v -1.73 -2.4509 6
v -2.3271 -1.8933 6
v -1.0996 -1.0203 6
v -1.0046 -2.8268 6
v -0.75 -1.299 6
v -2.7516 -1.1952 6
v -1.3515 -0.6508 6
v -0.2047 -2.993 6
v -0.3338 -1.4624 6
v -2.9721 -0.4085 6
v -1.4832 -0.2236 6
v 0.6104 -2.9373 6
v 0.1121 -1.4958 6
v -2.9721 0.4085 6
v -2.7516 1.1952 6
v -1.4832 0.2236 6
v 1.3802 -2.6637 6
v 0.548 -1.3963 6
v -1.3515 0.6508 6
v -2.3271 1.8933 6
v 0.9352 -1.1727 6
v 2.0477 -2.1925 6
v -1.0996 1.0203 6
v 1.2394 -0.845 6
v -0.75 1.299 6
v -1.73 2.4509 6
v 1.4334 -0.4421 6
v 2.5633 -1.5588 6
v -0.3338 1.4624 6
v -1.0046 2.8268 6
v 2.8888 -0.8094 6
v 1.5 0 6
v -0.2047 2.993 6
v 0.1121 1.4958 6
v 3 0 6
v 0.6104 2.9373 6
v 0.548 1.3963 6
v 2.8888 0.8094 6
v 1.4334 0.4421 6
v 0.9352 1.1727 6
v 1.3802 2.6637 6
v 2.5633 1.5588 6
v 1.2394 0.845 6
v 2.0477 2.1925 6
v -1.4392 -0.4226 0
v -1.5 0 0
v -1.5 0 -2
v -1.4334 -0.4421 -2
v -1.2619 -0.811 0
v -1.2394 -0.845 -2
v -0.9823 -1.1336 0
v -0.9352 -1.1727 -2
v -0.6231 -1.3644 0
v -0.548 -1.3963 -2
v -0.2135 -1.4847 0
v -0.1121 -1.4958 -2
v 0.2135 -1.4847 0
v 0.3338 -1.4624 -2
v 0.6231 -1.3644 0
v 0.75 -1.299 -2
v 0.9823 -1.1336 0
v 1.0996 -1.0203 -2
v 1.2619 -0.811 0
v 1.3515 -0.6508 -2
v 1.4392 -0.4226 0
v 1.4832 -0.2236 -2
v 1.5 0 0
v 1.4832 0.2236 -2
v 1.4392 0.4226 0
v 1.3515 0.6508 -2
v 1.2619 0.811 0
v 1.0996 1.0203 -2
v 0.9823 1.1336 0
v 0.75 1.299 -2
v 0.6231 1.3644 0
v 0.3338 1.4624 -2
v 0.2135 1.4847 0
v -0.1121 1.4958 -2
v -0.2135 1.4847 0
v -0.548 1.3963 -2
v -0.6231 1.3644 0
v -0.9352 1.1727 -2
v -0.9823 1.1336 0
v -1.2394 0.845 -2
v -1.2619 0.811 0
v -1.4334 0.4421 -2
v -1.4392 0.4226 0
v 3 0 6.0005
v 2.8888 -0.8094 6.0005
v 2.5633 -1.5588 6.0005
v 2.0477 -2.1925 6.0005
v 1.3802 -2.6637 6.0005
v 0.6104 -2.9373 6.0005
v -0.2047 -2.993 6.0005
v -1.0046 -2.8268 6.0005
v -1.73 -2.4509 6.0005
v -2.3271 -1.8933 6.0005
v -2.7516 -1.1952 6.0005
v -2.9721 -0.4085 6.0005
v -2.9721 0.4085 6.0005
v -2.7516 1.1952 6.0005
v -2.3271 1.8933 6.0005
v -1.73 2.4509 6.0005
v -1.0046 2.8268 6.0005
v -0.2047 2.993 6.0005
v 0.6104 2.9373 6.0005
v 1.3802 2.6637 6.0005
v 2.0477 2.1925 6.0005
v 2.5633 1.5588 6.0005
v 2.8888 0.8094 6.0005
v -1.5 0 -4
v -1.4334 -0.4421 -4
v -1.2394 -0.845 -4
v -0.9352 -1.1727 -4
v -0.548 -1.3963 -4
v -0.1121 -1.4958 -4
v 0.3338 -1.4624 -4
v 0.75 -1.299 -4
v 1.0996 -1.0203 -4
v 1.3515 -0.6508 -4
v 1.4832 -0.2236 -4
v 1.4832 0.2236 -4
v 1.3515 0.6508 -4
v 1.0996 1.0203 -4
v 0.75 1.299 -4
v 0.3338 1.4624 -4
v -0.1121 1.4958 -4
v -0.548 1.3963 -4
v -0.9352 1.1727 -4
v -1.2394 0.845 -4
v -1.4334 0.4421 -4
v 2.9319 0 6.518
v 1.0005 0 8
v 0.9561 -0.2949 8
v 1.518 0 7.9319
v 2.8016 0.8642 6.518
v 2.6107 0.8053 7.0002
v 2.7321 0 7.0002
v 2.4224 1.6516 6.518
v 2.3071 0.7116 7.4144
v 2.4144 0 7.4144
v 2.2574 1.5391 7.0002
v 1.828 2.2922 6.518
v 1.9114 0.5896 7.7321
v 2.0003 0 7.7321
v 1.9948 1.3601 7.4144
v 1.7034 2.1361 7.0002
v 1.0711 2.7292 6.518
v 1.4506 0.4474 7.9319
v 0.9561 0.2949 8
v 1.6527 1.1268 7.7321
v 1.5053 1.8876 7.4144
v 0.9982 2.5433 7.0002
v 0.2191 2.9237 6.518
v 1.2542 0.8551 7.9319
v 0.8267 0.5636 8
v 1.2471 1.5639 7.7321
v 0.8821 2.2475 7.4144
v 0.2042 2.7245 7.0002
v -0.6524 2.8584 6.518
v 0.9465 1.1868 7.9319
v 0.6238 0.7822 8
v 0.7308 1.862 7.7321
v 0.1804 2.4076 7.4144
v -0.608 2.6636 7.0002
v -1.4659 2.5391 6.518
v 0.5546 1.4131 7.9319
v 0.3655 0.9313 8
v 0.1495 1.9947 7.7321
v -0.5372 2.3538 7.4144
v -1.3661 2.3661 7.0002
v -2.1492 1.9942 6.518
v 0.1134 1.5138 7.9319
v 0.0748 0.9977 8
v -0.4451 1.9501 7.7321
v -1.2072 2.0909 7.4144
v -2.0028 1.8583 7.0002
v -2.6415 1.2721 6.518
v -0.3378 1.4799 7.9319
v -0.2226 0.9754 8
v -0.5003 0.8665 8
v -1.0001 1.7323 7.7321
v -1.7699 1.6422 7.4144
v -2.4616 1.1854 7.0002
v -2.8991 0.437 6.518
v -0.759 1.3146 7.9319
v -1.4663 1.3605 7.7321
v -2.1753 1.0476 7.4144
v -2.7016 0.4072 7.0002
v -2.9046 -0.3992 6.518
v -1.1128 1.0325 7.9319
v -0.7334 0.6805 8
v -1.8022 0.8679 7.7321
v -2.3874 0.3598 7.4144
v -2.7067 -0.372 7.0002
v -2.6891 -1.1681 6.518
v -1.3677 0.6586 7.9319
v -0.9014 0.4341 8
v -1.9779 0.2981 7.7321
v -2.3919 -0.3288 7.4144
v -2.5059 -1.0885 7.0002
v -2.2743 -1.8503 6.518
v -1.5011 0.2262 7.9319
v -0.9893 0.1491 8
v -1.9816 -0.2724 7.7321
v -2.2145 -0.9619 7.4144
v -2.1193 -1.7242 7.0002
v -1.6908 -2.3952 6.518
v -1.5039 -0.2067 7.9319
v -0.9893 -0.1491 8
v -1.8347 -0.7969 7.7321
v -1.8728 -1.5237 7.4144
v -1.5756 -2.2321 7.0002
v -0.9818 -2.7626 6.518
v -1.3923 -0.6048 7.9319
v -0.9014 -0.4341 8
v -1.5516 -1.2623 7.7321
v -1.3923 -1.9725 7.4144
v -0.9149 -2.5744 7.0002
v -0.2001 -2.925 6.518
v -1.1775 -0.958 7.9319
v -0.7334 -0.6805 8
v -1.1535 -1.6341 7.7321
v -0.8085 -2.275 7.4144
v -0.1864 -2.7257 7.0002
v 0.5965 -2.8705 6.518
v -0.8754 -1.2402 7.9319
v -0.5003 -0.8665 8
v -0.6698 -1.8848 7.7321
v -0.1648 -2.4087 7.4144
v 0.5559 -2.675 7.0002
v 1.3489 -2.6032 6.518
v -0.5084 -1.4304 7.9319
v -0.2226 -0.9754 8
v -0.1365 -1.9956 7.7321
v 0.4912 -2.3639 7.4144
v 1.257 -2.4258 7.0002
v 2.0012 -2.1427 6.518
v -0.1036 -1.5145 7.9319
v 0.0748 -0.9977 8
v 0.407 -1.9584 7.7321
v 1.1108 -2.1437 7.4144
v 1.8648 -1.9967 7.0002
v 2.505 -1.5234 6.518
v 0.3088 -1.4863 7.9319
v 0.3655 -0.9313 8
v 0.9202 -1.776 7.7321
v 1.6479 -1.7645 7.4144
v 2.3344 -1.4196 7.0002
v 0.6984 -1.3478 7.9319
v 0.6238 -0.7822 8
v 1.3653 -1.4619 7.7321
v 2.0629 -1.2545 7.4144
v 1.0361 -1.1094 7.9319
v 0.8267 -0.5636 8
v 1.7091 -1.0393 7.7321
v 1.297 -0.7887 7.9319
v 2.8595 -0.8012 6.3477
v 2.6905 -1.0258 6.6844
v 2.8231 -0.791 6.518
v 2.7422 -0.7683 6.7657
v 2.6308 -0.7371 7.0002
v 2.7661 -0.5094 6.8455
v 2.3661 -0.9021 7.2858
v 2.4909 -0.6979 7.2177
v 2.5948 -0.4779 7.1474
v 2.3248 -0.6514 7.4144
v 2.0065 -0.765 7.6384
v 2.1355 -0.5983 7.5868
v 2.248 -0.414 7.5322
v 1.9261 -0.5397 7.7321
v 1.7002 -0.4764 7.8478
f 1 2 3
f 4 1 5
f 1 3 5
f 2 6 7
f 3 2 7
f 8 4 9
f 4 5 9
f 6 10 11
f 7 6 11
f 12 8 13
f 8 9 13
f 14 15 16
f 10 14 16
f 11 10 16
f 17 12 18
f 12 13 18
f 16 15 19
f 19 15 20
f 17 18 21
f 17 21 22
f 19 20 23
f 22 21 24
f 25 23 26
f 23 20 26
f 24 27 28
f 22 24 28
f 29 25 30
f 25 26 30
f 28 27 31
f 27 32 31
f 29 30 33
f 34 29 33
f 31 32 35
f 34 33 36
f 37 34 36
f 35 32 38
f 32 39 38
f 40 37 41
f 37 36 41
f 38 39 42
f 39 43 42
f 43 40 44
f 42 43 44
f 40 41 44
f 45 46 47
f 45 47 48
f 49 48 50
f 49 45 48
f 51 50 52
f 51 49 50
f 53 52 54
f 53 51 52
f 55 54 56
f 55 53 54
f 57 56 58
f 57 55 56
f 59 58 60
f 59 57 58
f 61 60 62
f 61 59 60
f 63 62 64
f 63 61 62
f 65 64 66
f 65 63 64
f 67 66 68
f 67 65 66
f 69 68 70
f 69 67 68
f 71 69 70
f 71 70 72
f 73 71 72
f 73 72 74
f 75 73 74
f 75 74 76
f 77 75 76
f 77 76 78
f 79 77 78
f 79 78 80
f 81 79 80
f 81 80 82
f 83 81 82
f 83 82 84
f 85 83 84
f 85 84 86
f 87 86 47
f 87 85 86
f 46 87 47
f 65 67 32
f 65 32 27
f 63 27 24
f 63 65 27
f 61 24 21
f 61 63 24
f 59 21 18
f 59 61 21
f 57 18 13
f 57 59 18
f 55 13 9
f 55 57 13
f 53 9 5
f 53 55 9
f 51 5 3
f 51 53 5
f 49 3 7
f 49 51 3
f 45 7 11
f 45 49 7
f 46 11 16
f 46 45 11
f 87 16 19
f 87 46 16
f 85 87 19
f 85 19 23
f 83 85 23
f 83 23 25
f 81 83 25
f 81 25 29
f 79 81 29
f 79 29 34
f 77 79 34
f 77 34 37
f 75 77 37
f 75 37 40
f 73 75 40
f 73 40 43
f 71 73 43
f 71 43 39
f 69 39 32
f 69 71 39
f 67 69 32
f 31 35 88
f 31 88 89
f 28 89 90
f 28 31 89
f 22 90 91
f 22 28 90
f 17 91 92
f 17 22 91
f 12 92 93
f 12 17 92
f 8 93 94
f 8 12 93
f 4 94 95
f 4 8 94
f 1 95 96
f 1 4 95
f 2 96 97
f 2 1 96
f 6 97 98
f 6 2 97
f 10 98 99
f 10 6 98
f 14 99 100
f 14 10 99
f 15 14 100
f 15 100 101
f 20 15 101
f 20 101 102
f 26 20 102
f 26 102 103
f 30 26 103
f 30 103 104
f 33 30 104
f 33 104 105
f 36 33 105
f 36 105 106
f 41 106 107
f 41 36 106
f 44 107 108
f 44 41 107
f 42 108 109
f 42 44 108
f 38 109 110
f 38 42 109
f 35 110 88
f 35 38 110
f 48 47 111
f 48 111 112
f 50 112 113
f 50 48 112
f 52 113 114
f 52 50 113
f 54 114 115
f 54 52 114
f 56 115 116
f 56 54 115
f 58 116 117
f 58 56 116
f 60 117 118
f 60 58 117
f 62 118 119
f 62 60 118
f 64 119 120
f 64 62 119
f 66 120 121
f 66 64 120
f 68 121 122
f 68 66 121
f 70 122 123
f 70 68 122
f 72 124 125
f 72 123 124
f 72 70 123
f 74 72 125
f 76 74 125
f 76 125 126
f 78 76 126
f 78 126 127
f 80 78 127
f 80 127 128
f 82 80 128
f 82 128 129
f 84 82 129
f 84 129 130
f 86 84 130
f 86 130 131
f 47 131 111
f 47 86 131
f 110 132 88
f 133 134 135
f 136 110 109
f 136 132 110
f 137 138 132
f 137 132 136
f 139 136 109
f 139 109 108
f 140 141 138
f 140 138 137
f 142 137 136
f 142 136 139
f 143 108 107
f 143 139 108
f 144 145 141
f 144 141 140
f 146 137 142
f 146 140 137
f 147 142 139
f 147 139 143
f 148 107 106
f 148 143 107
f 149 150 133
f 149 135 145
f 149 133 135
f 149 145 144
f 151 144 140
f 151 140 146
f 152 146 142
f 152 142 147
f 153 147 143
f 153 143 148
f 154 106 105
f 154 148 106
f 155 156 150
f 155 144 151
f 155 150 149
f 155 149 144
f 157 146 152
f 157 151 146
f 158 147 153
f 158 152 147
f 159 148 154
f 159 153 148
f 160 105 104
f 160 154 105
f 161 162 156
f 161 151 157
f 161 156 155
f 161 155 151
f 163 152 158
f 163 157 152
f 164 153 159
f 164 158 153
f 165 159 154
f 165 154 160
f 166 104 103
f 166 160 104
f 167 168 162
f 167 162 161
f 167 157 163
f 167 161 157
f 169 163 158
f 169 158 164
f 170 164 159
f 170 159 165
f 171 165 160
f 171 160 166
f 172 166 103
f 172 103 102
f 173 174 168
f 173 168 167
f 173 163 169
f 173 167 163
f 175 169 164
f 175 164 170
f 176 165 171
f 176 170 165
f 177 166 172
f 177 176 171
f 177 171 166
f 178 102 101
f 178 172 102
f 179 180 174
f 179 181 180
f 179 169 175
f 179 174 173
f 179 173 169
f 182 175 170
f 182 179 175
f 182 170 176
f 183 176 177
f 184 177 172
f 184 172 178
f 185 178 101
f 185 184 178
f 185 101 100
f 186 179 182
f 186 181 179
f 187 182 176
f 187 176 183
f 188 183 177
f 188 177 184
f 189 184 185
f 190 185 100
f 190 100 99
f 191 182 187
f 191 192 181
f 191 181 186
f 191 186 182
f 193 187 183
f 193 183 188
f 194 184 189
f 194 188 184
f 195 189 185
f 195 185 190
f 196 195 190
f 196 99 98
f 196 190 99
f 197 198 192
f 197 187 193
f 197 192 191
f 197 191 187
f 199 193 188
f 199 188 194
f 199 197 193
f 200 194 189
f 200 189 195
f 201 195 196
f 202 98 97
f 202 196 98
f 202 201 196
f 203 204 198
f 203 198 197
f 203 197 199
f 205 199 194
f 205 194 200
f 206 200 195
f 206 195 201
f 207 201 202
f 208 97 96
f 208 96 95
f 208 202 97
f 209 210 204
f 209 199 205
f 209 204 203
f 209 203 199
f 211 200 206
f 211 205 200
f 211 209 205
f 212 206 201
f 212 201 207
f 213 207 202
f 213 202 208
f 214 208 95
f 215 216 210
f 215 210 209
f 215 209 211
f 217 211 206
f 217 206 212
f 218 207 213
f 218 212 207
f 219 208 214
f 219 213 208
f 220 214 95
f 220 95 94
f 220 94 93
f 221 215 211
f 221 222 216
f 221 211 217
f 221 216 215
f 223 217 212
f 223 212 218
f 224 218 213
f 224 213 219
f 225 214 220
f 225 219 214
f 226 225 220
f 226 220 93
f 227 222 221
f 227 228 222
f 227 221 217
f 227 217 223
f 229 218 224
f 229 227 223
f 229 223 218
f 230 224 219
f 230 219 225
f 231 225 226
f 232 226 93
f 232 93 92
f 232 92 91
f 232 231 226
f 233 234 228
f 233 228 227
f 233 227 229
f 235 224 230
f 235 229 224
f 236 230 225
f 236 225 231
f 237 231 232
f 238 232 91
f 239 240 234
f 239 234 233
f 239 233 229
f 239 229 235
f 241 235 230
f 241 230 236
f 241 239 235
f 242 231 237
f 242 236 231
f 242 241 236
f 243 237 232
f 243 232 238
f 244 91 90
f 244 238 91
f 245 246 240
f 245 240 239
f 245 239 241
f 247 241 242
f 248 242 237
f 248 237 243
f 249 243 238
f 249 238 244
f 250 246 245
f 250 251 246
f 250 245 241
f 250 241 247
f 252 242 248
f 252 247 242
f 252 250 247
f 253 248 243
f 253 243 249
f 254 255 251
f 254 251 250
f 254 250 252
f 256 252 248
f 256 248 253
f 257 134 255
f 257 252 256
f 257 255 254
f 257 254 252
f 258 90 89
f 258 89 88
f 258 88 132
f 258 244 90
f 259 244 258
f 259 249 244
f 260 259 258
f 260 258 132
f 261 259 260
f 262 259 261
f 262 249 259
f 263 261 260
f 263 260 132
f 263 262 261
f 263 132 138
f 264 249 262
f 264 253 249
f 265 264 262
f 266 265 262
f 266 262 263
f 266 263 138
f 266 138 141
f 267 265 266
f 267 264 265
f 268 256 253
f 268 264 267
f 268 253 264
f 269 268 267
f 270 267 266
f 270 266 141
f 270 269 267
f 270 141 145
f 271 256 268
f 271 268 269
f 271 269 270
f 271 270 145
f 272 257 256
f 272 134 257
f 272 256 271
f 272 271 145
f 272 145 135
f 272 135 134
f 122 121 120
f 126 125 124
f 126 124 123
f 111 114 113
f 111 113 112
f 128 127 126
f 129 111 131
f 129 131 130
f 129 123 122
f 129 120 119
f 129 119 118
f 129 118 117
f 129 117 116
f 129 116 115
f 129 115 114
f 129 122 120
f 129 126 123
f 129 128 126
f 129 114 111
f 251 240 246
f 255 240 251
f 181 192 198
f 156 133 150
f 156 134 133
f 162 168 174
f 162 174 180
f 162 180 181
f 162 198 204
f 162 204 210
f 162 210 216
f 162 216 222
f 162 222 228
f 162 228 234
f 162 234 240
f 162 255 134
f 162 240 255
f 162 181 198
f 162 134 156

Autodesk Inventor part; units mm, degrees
ref_plane "YZ Plane" through (0, 0, 0) normal (1, 0, 0) x (0, 1, 0)
ref_plane "XZ Plane" through (0, 0, 0) normal (0, 1, 0) x (-1, 0, 0)
ref_plane "XY Plane" through (0, 0, 0) normal (0, 0, 1) x (1, 0, 0)
sketch "スケッチ1" plane through (0, 0, 0) normal (0, 0, 1) x (1, 0, 0)
  circle A0 centre (0, 0) radius 1.5
  dimension "d0" = 3
extrude "押し出し1" add sketch "スケッチ1" along normal blind 6
sketch "スケッチ2" plane through (0, 0, 6) normal (0, 0, 1) x (1, 0, 0)
  circle A0 centre (0, 0) radius 1.5 projected
  circle A1 centre (0, 0) radius 3
  dimension "d3" = 6
extrude "押し出し2" add sketch "スケッチ2" along normal blind 2 contours A0 | A1
fillet "フィレット1" radius 2 1 edges at (-3, 0, 8)
thread "ねじ1" size "M3x0.5" class "6g" standard "ANSI Metric M Profile" full length
sketch "スケッチ3" plane through (0, 0, 0) normal (0, 0, -1) x (-1, 0, 0)
  circle A0 centre (0, 0) radius 1.5 projected
extrude "押し出し3" add sketch "スケッチ3" along normal blind 2
sketch "スケッチ4" plane through (0, 0, -2) normal (0, 0, -1) x (-1, 0, 0)
  circle A0 centre (0, 0) radius 1.5 projected
extrude "押し出し4" add sketch "スケッチ4" along normal blind 2
properties part number "SB　10mmなべネジ" material "Steel, Mild"
